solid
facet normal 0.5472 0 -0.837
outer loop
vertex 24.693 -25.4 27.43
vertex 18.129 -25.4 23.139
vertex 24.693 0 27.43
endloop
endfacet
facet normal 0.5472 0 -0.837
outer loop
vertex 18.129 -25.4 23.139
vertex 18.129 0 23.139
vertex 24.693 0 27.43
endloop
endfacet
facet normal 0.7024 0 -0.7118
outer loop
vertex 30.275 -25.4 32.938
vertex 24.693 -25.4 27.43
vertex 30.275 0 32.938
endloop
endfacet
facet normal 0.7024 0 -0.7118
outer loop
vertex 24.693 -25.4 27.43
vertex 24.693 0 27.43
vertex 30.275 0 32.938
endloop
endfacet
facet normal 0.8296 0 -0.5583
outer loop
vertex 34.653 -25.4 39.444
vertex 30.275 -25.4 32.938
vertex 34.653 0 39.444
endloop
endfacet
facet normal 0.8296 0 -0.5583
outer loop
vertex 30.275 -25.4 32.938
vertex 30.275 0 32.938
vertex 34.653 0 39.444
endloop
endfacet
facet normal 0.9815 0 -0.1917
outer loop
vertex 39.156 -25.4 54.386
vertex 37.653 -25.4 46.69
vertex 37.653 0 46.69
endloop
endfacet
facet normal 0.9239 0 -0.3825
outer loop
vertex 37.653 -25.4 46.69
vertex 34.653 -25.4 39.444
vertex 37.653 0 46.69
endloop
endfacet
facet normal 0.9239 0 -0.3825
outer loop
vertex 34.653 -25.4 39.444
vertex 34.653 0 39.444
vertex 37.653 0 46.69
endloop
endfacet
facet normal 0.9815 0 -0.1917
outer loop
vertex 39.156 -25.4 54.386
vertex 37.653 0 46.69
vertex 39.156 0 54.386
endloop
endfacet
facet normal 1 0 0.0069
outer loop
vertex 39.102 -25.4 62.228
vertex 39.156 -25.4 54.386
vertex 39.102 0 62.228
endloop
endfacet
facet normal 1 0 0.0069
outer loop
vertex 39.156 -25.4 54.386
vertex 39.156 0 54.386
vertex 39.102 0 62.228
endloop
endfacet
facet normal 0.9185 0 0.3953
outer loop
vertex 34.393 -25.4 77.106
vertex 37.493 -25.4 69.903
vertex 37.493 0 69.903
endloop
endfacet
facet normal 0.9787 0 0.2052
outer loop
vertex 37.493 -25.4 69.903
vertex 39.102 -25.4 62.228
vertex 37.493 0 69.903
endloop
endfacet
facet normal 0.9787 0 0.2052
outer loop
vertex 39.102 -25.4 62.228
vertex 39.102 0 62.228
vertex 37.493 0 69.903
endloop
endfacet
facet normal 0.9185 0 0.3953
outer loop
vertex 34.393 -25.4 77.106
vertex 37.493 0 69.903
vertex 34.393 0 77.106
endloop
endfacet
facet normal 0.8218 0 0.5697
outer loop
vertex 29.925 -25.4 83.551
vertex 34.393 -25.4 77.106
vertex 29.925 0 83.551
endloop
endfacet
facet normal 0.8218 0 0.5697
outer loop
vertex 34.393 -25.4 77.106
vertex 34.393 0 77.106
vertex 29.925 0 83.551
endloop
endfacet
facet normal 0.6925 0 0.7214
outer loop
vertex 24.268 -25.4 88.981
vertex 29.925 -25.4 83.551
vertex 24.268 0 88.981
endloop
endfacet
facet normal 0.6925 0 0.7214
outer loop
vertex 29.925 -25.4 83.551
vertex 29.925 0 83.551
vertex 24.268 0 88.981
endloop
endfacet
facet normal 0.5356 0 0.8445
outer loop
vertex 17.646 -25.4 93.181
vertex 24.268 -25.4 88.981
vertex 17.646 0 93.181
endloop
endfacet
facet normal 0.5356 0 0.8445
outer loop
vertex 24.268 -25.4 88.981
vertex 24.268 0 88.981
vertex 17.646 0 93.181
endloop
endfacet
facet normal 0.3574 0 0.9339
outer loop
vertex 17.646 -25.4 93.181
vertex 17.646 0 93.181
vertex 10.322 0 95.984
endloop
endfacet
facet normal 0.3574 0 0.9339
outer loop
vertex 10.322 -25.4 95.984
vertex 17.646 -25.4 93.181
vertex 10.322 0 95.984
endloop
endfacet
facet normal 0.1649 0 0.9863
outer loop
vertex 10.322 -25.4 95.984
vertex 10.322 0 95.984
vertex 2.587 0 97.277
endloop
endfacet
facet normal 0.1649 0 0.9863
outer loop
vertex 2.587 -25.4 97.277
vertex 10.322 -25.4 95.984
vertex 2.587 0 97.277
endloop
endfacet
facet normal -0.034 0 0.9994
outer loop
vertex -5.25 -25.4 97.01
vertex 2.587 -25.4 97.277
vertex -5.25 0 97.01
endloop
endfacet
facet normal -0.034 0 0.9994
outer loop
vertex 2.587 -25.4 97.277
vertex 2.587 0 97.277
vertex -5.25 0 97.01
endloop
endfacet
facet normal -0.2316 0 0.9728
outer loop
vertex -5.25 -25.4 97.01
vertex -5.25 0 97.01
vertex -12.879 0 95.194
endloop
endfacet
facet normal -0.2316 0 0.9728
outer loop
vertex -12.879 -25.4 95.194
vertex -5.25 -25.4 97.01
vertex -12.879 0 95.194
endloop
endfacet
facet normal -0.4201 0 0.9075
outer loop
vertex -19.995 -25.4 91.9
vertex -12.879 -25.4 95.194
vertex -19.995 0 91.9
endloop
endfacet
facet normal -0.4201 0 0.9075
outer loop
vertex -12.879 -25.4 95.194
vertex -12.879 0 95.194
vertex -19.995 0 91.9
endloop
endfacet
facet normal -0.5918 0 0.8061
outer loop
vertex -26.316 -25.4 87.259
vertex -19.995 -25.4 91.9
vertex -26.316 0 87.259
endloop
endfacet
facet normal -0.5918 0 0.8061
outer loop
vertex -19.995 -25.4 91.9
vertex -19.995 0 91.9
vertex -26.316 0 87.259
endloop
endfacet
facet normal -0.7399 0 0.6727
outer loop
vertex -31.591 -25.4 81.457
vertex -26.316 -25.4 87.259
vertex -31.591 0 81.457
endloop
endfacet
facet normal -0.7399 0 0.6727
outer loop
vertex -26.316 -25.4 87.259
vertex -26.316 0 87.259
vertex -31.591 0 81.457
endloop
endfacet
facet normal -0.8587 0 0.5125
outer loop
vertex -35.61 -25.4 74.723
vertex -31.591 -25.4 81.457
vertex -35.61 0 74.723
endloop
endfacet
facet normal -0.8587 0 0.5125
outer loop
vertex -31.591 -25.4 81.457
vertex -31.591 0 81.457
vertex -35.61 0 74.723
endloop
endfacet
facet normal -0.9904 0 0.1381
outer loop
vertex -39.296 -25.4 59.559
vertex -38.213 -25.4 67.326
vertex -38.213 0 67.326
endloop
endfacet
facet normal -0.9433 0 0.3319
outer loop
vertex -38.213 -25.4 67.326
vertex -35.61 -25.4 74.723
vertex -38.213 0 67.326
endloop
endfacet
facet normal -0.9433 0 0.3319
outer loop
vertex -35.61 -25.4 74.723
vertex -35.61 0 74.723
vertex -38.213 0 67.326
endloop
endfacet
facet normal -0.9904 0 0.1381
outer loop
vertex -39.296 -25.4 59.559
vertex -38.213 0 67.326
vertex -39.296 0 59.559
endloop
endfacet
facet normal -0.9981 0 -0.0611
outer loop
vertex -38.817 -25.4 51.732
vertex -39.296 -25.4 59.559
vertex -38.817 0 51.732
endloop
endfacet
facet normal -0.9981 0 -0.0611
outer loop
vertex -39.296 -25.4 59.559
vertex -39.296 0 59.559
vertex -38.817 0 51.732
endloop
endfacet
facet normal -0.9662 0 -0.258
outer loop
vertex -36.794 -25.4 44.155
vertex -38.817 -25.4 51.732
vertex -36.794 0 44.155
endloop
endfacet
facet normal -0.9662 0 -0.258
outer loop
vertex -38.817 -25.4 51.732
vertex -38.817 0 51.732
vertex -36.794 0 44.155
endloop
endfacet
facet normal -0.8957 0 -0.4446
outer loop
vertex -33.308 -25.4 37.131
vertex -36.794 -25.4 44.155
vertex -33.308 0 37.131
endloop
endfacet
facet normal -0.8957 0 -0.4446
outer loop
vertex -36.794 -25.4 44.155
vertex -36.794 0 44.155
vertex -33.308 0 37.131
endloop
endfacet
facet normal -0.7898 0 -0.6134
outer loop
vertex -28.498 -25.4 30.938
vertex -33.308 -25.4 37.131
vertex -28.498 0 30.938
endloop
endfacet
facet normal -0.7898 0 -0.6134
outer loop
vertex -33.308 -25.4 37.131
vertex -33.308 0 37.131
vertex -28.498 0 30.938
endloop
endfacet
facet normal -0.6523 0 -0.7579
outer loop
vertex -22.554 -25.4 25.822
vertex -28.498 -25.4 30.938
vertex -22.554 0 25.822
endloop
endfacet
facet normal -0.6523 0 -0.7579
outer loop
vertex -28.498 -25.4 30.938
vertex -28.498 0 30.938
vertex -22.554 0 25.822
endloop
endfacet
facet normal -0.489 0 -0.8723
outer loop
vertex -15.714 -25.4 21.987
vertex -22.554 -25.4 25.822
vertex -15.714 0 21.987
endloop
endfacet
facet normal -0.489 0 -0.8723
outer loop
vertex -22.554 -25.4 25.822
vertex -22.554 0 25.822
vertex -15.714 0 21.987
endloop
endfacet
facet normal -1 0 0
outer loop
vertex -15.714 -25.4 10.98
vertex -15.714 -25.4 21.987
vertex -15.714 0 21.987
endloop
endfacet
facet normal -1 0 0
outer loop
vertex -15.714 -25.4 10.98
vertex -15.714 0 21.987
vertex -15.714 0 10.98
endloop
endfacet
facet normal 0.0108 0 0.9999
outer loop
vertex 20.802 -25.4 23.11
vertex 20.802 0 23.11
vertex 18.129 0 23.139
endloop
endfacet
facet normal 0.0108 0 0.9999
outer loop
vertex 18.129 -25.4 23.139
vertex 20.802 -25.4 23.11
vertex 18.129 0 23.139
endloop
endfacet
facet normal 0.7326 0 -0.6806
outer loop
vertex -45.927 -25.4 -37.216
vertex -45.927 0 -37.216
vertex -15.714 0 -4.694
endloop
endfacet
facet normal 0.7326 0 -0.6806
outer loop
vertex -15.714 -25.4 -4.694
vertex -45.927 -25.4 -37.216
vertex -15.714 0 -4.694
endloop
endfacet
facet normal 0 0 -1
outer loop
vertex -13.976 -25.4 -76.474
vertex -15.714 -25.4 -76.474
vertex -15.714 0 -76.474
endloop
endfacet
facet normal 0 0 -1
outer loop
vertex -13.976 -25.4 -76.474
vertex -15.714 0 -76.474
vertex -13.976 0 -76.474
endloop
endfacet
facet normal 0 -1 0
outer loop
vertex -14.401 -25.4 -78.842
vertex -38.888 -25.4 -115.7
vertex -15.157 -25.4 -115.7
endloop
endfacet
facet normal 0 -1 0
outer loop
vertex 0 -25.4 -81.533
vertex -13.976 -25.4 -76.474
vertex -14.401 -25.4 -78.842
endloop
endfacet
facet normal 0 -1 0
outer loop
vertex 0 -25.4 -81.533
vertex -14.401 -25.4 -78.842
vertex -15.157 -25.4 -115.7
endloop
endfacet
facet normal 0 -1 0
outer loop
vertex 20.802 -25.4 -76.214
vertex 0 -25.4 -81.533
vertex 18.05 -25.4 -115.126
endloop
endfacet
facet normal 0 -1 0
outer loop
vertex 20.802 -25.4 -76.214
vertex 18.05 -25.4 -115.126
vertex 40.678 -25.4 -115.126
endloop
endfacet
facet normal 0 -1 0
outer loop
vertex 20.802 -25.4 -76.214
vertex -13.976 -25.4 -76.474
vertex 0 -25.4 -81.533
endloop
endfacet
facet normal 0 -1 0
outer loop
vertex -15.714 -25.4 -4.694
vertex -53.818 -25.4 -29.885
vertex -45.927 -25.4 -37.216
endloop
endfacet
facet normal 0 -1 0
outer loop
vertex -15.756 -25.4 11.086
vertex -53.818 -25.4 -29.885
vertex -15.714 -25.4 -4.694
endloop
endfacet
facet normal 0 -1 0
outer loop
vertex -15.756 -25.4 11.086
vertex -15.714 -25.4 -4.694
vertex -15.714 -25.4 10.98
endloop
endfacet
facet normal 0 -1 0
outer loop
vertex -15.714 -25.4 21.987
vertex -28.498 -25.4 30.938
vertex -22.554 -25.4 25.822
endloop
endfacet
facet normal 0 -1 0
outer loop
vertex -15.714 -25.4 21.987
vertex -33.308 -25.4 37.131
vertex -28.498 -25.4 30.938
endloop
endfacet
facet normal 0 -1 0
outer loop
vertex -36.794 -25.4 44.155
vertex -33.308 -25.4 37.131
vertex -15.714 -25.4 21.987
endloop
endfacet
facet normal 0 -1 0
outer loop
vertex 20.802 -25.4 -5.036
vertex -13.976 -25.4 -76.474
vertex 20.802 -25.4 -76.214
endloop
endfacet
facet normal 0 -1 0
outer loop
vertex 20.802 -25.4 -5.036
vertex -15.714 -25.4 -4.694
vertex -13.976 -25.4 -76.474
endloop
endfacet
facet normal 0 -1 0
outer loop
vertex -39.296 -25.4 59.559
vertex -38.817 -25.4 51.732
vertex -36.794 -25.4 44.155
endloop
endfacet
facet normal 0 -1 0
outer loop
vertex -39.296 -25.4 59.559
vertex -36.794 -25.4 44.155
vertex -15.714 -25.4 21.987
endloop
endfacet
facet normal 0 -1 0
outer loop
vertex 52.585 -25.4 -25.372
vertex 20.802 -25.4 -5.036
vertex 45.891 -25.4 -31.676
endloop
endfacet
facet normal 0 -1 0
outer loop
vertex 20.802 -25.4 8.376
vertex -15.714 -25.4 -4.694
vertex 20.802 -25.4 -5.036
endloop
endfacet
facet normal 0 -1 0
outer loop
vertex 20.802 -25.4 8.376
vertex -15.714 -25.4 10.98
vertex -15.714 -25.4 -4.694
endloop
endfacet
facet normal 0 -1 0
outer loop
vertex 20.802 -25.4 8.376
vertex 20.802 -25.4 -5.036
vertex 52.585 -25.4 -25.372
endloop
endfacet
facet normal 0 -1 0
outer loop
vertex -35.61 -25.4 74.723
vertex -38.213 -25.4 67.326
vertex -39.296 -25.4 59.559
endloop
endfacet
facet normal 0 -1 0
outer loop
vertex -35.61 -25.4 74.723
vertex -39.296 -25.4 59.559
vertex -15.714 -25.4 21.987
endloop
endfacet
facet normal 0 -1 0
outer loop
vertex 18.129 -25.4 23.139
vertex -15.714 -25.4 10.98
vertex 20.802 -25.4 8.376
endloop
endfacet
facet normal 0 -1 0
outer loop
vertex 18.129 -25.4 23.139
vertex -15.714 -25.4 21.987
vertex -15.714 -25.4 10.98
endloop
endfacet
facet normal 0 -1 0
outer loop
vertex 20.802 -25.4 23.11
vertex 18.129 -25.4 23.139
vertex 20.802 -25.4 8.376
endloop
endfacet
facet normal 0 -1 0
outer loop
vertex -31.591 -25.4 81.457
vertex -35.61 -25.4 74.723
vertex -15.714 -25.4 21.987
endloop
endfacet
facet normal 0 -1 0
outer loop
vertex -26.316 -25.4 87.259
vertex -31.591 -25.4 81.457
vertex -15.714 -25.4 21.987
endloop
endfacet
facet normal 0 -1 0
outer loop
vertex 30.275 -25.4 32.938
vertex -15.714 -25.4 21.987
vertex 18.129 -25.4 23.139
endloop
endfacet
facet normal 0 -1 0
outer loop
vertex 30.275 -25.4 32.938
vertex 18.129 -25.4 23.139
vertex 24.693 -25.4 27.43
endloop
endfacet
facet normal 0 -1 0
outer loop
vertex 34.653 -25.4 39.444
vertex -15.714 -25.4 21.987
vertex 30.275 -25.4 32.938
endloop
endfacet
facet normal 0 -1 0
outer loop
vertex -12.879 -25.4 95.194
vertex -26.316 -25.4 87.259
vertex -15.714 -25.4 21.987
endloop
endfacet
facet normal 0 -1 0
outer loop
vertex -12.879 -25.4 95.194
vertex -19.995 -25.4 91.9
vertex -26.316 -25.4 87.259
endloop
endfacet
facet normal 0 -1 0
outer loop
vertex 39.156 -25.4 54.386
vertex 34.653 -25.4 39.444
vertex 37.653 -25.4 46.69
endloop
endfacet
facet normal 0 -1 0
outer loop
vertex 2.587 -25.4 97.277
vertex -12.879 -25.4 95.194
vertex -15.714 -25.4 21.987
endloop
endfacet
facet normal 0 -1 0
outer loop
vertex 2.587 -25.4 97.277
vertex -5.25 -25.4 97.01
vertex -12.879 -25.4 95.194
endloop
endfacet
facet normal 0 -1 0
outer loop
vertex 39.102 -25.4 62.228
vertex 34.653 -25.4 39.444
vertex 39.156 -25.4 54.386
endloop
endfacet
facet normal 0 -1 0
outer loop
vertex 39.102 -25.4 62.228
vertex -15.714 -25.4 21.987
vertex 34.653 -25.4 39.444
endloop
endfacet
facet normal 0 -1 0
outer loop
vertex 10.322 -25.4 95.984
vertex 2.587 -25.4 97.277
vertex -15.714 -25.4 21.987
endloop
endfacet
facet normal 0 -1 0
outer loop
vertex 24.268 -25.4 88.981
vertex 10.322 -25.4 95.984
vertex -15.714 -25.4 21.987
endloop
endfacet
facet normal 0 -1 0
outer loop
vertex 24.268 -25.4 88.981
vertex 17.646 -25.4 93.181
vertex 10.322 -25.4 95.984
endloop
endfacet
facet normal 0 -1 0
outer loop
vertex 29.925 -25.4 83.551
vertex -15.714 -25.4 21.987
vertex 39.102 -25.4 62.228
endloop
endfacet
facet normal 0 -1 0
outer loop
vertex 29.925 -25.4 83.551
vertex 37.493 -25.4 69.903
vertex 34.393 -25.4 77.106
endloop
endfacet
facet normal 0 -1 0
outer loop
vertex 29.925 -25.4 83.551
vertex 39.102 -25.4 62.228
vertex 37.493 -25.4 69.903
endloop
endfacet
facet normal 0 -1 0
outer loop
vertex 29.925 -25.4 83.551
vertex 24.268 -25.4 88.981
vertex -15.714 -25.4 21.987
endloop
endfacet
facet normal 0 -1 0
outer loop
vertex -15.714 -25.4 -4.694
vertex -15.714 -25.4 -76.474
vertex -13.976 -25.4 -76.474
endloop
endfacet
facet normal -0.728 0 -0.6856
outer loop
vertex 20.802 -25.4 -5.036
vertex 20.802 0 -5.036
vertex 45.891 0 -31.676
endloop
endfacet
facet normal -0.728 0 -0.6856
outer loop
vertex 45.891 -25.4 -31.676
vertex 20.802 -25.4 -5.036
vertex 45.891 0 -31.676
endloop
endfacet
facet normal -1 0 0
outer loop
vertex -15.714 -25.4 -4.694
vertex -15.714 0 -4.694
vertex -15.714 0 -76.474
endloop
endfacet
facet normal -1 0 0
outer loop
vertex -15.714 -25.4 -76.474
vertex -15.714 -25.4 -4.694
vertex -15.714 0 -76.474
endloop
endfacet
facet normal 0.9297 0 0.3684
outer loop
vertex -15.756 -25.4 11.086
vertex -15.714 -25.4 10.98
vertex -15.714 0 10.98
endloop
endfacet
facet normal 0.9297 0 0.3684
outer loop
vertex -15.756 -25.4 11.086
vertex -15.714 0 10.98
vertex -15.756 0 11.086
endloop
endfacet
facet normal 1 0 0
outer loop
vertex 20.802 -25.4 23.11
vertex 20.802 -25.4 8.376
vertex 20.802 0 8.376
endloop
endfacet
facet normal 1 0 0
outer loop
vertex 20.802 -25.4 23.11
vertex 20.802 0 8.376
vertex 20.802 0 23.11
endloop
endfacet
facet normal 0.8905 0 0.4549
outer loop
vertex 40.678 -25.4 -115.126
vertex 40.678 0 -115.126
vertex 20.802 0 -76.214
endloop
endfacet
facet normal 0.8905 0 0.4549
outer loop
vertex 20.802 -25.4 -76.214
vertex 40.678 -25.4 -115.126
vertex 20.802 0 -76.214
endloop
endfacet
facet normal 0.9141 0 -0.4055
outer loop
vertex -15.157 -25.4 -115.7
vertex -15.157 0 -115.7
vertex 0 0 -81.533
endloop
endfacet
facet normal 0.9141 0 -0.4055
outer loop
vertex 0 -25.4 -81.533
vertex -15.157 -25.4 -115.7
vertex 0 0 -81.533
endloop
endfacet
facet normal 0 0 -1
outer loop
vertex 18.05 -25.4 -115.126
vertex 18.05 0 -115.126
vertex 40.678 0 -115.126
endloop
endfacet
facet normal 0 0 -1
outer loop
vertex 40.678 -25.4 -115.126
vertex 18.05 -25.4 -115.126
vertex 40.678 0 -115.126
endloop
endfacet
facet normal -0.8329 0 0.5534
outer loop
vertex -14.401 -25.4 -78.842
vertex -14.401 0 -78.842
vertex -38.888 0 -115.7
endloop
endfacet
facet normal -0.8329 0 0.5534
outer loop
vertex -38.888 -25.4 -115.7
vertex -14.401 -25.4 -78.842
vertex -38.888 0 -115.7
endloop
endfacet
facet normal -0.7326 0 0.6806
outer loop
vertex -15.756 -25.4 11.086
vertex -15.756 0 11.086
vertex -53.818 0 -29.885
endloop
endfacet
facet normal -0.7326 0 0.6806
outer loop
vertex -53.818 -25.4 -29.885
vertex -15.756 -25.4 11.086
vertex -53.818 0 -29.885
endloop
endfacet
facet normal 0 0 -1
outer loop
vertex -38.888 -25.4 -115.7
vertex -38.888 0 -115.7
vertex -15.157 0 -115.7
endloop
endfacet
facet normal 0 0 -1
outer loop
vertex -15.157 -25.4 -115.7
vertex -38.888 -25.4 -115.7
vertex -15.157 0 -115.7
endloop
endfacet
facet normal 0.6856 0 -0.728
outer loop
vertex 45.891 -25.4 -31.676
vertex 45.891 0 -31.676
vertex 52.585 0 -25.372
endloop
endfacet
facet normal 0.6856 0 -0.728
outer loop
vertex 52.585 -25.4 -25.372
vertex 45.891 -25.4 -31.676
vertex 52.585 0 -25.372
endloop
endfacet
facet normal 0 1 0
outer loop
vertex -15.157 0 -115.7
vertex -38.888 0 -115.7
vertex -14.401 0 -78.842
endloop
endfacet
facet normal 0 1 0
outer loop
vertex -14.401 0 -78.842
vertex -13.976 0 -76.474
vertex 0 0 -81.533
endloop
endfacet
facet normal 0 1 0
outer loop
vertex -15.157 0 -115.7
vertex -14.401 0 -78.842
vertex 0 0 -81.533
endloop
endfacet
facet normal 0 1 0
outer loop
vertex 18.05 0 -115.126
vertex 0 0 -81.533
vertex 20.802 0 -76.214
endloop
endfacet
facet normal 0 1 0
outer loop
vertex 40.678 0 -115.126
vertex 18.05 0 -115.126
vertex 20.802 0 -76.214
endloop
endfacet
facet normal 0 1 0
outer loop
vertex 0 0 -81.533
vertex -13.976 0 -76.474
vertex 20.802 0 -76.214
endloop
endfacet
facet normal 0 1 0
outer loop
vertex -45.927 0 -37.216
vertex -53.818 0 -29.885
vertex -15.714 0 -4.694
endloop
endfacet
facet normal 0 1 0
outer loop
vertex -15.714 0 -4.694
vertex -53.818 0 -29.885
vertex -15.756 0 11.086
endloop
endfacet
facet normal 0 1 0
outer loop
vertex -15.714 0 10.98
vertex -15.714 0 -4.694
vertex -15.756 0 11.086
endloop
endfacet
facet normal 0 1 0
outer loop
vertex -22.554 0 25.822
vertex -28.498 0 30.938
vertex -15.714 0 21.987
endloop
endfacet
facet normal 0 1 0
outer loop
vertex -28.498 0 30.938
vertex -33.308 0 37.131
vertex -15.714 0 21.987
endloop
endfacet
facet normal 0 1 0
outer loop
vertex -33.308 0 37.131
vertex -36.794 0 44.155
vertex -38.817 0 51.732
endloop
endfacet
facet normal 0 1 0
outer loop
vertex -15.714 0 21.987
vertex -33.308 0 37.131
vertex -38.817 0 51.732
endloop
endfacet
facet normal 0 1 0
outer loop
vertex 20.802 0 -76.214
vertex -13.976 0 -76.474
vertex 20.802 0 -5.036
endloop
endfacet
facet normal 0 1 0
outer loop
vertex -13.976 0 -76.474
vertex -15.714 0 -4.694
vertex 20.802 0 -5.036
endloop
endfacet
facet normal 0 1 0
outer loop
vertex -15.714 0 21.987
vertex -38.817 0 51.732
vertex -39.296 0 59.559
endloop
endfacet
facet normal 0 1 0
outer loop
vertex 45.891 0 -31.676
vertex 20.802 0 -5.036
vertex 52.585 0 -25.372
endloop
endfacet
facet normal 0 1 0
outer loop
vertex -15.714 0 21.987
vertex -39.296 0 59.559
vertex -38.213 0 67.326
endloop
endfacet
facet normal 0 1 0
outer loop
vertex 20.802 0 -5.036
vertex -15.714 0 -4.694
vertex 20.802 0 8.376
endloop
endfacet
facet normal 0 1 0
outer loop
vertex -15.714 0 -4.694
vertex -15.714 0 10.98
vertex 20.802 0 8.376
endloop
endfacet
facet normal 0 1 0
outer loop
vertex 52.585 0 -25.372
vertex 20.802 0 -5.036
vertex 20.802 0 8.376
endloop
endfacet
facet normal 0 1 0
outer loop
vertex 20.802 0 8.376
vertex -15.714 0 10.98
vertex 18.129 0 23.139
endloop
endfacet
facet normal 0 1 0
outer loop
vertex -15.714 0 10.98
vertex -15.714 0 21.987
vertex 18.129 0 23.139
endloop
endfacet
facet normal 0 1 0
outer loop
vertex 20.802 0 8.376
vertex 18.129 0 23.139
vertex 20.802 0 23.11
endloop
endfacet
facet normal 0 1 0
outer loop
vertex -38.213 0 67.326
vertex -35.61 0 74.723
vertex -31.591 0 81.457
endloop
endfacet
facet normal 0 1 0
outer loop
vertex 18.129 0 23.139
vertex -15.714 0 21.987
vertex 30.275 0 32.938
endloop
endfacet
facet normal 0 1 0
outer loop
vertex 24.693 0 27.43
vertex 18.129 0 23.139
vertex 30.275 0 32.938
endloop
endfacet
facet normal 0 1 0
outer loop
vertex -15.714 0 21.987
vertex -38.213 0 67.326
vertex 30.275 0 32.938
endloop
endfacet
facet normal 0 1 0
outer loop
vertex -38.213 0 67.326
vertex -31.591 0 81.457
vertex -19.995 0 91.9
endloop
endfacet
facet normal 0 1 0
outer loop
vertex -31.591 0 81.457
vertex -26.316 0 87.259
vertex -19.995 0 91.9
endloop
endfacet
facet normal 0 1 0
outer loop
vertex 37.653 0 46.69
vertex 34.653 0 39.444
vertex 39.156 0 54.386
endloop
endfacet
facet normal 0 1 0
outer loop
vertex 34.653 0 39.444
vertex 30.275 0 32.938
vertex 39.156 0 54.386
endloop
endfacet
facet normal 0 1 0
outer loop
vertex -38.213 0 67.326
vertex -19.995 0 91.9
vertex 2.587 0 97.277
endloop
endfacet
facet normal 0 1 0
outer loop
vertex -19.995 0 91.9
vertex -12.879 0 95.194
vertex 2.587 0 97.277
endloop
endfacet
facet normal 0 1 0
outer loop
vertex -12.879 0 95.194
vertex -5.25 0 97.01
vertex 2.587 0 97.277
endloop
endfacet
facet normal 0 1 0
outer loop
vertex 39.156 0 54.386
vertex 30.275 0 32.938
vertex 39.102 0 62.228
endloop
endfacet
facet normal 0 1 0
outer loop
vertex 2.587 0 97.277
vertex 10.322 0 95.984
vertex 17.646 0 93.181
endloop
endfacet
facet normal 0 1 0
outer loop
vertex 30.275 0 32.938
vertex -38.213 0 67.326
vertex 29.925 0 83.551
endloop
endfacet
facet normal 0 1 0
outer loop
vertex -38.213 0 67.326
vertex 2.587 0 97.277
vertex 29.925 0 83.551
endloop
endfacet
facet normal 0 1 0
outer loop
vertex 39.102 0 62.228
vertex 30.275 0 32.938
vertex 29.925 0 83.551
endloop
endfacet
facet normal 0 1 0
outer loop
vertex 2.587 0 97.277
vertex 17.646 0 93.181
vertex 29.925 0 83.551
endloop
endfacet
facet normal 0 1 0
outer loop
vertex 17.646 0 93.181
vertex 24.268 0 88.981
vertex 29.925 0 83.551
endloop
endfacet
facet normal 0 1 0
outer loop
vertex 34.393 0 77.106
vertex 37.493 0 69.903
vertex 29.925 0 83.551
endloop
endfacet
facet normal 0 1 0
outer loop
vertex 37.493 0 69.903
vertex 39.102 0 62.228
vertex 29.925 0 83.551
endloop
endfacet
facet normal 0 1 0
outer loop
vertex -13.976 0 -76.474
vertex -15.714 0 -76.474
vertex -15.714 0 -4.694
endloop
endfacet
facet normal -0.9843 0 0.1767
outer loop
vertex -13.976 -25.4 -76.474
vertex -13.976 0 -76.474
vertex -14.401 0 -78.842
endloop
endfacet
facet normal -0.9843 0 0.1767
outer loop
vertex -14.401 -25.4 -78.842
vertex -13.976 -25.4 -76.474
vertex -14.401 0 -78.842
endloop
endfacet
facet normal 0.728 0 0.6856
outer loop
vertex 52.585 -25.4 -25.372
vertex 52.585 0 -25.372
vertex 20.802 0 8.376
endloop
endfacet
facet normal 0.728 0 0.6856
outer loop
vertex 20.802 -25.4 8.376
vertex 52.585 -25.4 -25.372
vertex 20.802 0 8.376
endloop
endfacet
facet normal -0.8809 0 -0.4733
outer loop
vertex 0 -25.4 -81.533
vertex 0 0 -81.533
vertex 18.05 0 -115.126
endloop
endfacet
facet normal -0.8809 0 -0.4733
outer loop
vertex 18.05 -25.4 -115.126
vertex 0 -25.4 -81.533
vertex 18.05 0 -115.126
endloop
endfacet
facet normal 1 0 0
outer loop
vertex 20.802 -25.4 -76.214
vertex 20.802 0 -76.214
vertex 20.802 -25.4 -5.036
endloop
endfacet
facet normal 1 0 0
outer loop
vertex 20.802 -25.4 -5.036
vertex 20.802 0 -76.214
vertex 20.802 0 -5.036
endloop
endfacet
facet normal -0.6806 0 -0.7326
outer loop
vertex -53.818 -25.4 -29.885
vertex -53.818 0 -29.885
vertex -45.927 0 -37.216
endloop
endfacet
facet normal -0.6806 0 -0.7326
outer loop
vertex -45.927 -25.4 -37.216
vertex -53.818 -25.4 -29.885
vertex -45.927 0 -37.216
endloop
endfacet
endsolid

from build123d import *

# Parameters (mm, degrees)
F0_R     = 39.32561
F1_DEPTH = 25.4
F3_DEPTH = 25.4
F5_DEPTH = 25.4
F7_DEPTH = 25.4


with BuildPart() as f1:
    # F0 (on Front) → F1 (new body)
    with BuildSketch(Plane.XZ):
        with Locations((0, 58.036841)):
            Circle(F0_R)
    extrude(amount=F1_DEPTH)

    # F2 (on Front) → F3 (join)
    with BuildSketch(Plane.XZ):
        Polygon((20.801723, 23.11036), (-15.714049, 23.506835), (-15.714049, -76.474115), (20.801723, -76.474115), align=None)
    extrude(amount=F3_DEPTH)

    # F4 (on Front) → F5 (join)
    with BuildSketch(Plane.XZ):
        Polygon((-11.353261, 0), (-15.755951, 11.085525), (-53.817809, -29.885441), (-45.926862, -37.216098), align=None)
        Polygon((52.584887, -25.371686), (20.5549, 8.637682), (16.058708, 0), (45.89106, -31.675924), align=None)
    extrude(amount=F5_DEPTH)

    # F6 (on Front) → F7 (join)
    with BuildSketch(Plane.XZ):
        Polygon((-12.695789, -69.341376), (-14.400601, -78.842267), (-38.887709, -115.700036), (-15.157491, -115.700036), (0, -81.533164), (0, -69.341376), align=None)
        Polygon((6.92448, -69.341376), (0, -69.341376), (0, -81.533164), (18.049568, -115.125895), (40.677667, -115.125895), (17.291129, -69.341376), align=None)
    extrude(amount=F7_DEPTH)


solid = f1.part
